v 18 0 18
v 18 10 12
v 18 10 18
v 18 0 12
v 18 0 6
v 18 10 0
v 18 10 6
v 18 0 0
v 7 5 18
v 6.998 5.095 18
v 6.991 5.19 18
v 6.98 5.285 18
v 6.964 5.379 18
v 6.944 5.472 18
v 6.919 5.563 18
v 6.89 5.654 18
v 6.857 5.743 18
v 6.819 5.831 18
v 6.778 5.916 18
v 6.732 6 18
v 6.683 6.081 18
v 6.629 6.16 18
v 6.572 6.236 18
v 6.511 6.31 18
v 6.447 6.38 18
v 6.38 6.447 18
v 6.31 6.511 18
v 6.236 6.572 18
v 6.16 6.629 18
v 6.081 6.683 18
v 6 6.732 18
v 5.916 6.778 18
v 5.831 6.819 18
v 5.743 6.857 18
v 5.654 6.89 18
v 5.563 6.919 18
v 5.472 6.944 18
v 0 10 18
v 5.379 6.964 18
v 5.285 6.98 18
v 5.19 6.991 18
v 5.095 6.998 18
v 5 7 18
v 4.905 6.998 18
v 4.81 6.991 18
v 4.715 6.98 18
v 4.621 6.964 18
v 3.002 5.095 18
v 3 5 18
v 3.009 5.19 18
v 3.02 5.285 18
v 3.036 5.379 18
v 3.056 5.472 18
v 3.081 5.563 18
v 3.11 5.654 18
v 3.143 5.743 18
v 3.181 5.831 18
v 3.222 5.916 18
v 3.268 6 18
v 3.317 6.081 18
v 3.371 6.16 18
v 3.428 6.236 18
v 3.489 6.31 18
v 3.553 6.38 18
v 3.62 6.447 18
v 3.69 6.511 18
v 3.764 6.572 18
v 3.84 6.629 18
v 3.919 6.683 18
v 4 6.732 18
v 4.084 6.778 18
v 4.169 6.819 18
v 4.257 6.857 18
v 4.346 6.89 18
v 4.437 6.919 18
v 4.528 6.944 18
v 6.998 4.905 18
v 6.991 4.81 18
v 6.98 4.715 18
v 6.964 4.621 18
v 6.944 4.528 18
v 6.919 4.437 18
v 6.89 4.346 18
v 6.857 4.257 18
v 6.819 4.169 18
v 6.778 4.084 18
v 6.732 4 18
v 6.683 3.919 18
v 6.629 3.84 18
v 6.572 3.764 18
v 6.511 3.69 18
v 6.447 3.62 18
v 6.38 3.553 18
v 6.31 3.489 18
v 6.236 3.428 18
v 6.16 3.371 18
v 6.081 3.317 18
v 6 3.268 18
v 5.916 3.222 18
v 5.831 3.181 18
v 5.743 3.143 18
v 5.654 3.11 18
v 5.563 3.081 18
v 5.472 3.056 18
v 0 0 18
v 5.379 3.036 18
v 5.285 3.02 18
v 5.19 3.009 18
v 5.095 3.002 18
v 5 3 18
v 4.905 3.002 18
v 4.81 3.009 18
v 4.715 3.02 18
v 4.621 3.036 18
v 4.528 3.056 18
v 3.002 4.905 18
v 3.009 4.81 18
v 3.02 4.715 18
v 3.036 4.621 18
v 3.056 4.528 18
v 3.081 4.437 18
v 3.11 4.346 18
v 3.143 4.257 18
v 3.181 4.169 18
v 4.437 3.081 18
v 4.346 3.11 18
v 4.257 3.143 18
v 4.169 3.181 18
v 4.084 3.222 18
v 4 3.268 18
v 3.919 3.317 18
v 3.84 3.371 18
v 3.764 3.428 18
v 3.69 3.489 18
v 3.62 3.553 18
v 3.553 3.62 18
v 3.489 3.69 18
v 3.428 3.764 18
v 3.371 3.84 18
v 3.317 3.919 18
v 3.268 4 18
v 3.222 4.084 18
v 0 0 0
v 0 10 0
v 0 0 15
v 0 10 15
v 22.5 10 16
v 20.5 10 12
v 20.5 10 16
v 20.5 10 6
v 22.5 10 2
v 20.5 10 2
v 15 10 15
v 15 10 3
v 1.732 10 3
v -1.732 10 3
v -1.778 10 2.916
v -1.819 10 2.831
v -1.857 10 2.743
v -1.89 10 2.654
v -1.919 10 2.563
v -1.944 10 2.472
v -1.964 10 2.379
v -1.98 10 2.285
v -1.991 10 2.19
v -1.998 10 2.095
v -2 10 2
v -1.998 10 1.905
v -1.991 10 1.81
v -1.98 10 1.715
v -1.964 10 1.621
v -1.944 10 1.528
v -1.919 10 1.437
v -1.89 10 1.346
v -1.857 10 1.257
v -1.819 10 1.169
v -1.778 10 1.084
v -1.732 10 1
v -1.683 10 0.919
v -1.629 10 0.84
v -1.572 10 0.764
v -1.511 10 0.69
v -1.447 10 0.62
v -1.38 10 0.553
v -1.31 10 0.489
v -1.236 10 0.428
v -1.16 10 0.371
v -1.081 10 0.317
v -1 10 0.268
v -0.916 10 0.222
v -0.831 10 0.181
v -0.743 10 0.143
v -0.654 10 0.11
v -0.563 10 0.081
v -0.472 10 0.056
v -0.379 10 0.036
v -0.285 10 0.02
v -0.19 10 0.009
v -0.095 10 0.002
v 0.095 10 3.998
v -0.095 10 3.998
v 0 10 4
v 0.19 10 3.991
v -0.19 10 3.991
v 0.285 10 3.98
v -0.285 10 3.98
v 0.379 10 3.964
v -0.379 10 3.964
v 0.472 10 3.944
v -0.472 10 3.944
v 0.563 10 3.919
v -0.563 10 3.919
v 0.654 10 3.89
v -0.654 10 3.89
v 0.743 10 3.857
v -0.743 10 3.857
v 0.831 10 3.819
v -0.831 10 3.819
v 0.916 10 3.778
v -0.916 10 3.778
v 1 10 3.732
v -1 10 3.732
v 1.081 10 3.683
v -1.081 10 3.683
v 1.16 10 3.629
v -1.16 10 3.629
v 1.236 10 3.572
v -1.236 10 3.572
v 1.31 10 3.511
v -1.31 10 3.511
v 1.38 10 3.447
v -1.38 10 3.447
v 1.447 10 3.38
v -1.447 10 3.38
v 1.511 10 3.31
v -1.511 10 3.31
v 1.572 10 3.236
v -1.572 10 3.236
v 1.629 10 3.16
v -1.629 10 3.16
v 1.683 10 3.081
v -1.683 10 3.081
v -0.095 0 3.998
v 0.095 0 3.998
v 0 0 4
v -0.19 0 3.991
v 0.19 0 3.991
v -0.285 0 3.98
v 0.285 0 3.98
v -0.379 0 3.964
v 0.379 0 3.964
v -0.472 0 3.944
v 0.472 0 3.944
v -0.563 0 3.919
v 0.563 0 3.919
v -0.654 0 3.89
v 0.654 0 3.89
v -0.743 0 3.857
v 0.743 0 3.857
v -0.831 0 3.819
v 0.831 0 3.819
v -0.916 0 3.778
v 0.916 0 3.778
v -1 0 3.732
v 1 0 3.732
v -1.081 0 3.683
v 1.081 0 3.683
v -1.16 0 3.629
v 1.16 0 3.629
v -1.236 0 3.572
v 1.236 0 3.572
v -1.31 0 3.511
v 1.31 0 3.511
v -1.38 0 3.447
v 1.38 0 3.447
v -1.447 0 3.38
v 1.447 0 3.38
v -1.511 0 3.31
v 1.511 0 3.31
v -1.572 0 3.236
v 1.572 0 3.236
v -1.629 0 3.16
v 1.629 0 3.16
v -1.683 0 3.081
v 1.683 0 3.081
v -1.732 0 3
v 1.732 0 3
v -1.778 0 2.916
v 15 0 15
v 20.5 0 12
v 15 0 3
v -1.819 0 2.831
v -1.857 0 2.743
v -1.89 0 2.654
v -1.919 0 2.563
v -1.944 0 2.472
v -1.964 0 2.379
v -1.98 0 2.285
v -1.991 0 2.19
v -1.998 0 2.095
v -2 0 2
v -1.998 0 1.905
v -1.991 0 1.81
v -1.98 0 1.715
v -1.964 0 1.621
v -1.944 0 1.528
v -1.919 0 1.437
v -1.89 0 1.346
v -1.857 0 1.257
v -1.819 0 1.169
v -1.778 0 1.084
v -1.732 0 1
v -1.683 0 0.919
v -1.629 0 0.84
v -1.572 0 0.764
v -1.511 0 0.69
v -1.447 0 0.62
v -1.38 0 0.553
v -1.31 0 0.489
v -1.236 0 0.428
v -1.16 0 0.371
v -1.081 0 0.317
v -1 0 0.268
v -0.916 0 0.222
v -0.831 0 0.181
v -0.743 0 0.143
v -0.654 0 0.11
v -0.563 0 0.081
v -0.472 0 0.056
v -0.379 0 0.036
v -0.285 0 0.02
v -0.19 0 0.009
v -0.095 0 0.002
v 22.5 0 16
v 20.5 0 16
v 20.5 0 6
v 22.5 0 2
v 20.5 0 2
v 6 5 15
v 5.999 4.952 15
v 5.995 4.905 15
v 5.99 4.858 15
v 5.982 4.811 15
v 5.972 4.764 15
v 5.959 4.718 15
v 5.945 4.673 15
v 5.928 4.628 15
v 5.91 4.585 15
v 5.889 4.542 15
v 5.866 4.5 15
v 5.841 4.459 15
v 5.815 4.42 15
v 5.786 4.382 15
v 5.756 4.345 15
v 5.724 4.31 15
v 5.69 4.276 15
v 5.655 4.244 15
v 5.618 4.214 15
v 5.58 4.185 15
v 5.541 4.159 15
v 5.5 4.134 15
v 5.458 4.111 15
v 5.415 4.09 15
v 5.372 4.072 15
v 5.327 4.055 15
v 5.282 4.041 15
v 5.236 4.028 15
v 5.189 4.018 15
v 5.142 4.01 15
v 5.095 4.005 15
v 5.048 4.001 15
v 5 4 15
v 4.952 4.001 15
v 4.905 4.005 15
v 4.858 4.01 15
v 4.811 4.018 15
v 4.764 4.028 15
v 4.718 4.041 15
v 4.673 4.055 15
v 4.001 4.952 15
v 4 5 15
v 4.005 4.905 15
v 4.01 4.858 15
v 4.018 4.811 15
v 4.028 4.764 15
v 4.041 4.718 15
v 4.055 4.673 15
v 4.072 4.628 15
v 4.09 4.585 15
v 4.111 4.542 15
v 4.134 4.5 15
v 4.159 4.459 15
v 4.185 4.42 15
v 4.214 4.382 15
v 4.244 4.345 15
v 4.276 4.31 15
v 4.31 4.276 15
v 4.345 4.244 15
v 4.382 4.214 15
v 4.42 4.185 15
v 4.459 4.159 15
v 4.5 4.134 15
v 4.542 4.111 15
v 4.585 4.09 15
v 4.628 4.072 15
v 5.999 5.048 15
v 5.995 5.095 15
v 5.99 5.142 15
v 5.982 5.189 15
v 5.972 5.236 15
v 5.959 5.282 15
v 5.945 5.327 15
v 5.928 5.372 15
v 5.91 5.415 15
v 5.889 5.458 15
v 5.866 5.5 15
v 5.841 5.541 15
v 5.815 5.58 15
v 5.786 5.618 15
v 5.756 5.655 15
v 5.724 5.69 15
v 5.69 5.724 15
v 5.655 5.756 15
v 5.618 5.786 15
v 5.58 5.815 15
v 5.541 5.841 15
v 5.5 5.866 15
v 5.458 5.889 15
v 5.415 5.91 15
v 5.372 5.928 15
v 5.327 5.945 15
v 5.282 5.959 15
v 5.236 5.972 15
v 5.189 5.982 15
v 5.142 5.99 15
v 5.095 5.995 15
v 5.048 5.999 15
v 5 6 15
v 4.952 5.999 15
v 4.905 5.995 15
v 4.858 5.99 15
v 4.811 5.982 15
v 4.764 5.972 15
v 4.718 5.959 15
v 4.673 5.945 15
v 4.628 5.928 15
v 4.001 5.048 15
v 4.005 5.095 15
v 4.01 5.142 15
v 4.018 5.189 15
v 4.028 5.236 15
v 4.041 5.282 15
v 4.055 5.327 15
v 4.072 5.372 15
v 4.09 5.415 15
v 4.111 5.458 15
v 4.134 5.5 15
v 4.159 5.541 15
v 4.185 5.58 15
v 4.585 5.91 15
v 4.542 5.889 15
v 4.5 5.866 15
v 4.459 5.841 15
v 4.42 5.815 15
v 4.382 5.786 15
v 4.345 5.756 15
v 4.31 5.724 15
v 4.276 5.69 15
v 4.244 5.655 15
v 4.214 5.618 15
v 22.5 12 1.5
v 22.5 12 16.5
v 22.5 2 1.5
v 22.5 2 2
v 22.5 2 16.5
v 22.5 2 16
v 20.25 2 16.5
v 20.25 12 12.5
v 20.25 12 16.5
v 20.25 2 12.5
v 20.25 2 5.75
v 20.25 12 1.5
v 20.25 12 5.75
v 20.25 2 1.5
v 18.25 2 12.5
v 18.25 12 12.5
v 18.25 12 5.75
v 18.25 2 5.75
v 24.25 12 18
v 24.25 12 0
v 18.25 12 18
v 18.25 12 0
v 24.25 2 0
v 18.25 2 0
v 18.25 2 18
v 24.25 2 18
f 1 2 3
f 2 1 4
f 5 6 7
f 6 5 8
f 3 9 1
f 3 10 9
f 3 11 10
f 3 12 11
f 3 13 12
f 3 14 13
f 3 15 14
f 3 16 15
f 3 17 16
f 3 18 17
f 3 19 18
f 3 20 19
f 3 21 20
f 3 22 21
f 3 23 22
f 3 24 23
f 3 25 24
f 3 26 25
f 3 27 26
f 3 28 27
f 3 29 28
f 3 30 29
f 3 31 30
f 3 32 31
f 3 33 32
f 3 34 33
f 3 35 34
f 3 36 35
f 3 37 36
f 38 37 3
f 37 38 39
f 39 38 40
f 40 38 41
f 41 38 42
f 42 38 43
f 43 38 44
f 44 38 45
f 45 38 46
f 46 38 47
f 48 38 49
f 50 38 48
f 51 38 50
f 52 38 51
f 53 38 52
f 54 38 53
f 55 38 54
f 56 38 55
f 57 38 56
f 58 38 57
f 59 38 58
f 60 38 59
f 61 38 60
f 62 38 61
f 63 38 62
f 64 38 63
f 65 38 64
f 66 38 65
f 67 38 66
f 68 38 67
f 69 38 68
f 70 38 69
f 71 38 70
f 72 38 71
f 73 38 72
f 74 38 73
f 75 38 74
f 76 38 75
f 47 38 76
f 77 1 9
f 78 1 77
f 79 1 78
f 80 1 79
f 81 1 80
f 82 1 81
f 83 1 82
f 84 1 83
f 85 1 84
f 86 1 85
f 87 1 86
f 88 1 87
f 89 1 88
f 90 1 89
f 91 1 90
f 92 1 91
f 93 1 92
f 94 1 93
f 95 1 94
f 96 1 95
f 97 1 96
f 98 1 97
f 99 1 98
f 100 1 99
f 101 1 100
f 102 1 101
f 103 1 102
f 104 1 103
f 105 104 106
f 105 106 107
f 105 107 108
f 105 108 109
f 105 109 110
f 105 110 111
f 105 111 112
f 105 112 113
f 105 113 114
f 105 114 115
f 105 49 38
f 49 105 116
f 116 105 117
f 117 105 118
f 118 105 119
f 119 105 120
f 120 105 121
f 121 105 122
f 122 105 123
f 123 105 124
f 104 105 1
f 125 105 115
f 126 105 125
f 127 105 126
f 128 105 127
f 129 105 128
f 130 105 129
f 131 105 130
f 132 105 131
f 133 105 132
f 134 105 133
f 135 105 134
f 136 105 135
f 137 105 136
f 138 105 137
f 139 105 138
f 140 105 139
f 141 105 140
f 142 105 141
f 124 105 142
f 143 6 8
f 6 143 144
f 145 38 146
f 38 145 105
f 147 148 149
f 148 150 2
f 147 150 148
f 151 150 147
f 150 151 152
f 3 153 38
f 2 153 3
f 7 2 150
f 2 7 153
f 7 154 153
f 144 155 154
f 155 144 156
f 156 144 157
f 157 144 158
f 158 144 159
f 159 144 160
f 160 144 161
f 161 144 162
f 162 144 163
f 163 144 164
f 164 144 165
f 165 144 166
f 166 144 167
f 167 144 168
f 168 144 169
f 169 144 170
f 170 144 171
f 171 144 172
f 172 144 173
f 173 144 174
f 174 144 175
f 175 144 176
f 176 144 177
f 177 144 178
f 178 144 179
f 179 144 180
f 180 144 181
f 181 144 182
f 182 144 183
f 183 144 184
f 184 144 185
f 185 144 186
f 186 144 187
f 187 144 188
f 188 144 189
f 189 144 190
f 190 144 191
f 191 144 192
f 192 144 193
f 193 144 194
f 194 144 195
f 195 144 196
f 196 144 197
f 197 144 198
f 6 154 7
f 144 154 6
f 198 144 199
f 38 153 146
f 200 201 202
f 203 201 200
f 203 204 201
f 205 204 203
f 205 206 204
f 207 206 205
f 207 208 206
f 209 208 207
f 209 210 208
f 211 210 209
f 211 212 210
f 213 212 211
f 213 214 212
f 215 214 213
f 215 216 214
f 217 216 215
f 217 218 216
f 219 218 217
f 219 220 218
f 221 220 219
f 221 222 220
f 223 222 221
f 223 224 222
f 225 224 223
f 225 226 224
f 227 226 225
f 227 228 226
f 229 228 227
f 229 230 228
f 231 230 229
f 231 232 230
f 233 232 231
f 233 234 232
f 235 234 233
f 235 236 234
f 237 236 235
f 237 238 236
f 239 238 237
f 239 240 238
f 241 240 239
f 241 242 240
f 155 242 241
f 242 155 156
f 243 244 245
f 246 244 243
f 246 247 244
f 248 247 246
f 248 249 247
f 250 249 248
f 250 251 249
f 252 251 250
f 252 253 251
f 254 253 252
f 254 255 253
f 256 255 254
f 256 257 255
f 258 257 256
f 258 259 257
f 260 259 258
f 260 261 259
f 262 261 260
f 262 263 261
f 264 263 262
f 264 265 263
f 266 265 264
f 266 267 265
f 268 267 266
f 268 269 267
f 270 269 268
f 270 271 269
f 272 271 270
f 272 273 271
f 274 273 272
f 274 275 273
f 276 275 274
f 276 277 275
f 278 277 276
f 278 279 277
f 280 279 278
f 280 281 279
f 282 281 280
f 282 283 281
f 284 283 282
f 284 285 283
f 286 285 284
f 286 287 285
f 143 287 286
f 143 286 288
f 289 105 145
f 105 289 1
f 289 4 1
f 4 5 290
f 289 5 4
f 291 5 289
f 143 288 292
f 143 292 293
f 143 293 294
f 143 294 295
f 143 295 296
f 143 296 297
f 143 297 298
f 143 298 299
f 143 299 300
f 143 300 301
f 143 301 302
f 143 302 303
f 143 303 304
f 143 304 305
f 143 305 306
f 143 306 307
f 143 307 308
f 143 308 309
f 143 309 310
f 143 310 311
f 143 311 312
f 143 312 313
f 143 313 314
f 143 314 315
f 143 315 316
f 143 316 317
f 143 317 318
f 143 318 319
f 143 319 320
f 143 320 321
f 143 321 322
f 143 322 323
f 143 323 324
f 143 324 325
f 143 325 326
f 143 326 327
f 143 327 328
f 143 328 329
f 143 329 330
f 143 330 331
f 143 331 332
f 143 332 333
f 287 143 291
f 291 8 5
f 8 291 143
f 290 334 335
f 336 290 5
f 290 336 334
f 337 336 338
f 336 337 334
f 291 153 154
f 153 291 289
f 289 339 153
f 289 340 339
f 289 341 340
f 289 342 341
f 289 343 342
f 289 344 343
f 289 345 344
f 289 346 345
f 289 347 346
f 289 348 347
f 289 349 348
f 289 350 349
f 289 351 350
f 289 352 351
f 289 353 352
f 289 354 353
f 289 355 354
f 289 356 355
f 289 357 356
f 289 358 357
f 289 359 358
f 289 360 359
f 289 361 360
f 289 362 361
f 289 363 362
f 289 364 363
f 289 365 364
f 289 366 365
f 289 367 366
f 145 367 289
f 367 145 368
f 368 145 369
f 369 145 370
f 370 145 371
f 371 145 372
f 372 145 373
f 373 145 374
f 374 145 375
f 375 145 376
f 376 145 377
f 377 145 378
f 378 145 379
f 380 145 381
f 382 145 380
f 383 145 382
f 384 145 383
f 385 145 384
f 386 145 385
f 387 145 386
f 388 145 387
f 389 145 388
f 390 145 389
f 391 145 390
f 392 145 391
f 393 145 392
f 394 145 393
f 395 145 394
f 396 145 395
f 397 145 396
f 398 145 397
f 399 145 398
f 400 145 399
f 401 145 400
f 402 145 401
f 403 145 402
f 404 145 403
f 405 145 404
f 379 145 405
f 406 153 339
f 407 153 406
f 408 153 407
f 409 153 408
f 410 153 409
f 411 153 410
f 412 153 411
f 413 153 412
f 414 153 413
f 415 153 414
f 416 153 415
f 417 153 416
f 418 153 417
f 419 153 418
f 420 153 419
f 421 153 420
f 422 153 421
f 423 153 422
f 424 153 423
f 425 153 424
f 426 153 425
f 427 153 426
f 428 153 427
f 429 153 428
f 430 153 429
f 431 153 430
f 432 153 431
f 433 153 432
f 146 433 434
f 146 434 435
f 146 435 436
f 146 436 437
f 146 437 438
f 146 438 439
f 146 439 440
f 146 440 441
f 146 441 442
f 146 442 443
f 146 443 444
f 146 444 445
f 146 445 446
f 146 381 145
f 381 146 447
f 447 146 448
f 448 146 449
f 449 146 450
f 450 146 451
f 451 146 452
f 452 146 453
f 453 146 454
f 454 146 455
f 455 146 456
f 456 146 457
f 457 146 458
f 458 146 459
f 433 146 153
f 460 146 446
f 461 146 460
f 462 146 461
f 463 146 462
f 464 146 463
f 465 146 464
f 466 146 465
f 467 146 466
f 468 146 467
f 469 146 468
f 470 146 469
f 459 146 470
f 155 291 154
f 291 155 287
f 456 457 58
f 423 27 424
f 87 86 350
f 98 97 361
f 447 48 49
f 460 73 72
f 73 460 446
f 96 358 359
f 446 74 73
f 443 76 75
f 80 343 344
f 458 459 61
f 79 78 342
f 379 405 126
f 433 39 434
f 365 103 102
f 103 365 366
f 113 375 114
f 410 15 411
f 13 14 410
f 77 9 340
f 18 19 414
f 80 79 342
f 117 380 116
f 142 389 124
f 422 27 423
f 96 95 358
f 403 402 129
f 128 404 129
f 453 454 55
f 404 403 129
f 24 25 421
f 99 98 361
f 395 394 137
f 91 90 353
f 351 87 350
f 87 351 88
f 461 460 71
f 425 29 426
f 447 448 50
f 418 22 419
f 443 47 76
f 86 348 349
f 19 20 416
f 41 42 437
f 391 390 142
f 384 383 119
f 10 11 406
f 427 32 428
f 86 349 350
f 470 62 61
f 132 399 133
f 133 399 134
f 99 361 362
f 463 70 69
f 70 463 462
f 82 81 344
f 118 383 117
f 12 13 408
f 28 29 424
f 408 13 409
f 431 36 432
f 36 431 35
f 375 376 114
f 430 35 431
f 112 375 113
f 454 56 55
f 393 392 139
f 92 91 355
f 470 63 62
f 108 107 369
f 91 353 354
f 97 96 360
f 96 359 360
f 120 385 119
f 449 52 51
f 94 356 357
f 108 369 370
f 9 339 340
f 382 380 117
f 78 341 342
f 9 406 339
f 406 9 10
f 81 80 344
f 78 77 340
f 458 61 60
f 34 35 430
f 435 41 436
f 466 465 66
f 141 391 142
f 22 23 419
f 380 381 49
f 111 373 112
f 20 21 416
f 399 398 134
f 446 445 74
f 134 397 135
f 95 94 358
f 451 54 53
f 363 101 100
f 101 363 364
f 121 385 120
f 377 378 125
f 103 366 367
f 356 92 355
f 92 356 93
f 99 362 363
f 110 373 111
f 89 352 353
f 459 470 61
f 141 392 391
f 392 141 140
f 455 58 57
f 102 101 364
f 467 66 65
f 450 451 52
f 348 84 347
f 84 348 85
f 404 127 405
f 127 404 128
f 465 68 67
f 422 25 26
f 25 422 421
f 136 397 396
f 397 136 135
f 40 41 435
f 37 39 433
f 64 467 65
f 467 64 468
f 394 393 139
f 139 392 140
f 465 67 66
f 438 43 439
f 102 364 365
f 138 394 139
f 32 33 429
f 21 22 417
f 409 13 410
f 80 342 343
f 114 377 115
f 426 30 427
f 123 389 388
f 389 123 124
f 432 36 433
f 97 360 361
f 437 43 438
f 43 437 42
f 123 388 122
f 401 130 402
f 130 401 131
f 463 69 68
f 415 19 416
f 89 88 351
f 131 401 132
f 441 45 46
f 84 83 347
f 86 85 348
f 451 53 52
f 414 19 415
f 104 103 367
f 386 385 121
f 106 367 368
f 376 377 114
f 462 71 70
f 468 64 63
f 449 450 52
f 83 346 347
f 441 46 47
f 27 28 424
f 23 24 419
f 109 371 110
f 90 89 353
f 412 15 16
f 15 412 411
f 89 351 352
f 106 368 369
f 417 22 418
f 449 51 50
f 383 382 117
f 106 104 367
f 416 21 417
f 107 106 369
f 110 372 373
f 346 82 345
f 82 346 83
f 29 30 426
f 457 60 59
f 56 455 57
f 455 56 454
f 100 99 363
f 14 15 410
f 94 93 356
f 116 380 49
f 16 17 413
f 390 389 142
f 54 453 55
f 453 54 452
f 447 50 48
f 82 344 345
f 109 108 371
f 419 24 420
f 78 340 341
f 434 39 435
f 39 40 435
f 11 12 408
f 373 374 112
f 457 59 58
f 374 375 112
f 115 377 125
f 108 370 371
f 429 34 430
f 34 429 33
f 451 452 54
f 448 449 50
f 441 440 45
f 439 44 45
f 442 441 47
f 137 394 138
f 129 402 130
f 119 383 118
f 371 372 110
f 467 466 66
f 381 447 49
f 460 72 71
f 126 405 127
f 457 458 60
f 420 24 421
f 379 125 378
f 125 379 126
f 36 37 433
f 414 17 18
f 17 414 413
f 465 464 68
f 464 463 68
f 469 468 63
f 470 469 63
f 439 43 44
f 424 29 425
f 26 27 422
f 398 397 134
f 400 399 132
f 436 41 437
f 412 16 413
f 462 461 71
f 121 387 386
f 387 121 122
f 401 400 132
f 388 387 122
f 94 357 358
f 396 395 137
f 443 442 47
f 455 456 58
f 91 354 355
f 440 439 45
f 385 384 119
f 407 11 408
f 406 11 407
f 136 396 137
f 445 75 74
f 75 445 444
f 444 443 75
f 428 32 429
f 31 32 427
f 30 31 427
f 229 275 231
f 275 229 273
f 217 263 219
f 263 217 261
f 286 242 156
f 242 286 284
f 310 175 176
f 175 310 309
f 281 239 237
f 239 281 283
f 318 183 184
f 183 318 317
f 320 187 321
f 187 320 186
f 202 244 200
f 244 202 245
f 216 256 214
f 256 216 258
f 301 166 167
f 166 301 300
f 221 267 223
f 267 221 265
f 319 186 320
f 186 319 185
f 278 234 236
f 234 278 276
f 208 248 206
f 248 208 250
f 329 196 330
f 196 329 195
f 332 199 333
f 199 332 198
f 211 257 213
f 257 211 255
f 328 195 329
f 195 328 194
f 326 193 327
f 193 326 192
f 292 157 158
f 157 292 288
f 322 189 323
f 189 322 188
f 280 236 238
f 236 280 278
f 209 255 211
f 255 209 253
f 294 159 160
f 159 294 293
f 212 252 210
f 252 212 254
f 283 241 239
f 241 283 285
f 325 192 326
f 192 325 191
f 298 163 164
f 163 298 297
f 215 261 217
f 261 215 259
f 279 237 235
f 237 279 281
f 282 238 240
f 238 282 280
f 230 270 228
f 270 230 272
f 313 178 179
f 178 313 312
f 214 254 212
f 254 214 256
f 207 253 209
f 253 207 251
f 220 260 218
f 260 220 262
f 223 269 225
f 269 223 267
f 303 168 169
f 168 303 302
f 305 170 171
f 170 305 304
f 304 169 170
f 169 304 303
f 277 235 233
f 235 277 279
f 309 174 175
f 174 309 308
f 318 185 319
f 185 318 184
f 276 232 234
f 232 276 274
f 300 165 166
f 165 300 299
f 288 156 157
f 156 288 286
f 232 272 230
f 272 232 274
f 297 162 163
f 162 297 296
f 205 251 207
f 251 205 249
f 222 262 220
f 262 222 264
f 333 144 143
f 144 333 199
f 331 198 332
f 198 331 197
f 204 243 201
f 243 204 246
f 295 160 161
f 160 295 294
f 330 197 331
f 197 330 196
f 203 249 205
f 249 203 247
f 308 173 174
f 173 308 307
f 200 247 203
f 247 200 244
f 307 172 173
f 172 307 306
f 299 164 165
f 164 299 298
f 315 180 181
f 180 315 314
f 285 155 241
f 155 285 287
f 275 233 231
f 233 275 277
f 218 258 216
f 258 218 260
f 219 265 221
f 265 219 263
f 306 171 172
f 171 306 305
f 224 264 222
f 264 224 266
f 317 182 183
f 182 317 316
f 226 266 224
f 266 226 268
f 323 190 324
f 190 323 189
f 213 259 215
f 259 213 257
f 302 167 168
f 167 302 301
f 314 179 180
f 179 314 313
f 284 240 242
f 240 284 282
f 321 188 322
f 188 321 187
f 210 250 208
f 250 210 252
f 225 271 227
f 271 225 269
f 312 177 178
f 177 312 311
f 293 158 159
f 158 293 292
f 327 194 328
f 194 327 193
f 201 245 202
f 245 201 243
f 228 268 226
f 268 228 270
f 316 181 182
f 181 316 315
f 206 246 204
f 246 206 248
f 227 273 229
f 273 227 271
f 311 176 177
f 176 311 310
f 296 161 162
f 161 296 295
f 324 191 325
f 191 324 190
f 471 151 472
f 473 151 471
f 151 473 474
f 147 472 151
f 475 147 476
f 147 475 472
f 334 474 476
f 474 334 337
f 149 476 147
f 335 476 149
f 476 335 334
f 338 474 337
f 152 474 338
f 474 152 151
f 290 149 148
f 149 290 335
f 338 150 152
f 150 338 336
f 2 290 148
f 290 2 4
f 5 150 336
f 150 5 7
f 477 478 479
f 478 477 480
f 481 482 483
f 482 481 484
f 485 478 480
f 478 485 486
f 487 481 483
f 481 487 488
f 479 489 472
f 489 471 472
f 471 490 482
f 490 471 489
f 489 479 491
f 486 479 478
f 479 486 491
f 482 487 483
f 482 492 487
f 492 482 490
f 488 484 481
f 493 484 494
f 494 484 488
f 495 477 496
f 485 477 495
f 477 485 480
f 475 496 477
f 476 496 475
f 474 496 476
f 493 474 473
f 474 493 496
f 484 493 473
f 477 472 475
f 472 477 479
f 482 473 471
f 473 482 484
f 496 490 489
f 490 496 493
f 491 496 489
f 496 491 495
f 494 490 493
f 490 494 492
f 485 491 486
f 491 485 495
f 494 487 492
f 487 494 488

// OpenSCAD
$fn=132;
clip();
translate([17.5,2,0]){bracket();}
module clip(){
difference(){
cube([18,10,18]);
translate([0,0,3]){cube([15,10,12]);}  
translate([5,5,15]){cylinder(3,1,2,5);}
}    
rrad = 2;
translate([0,0,rrad]){rotate([-90,0,0]){cylinder(10,rrad,rrad);}}
translate([20.5,0,2]){cube([2,10,14]);}

translate([18,0,6]){cube([2.5,10,6]);}
}


module bracket(){
difference(){
translate([.75,0,0]){cube([6,10,18]);}
union(){
translate([0,0,5.75]){cube([2.75,10,6.75]);}
translate([2.75,0,1.5]){cube([2.25,11.5,15]);}
}


    }
}
